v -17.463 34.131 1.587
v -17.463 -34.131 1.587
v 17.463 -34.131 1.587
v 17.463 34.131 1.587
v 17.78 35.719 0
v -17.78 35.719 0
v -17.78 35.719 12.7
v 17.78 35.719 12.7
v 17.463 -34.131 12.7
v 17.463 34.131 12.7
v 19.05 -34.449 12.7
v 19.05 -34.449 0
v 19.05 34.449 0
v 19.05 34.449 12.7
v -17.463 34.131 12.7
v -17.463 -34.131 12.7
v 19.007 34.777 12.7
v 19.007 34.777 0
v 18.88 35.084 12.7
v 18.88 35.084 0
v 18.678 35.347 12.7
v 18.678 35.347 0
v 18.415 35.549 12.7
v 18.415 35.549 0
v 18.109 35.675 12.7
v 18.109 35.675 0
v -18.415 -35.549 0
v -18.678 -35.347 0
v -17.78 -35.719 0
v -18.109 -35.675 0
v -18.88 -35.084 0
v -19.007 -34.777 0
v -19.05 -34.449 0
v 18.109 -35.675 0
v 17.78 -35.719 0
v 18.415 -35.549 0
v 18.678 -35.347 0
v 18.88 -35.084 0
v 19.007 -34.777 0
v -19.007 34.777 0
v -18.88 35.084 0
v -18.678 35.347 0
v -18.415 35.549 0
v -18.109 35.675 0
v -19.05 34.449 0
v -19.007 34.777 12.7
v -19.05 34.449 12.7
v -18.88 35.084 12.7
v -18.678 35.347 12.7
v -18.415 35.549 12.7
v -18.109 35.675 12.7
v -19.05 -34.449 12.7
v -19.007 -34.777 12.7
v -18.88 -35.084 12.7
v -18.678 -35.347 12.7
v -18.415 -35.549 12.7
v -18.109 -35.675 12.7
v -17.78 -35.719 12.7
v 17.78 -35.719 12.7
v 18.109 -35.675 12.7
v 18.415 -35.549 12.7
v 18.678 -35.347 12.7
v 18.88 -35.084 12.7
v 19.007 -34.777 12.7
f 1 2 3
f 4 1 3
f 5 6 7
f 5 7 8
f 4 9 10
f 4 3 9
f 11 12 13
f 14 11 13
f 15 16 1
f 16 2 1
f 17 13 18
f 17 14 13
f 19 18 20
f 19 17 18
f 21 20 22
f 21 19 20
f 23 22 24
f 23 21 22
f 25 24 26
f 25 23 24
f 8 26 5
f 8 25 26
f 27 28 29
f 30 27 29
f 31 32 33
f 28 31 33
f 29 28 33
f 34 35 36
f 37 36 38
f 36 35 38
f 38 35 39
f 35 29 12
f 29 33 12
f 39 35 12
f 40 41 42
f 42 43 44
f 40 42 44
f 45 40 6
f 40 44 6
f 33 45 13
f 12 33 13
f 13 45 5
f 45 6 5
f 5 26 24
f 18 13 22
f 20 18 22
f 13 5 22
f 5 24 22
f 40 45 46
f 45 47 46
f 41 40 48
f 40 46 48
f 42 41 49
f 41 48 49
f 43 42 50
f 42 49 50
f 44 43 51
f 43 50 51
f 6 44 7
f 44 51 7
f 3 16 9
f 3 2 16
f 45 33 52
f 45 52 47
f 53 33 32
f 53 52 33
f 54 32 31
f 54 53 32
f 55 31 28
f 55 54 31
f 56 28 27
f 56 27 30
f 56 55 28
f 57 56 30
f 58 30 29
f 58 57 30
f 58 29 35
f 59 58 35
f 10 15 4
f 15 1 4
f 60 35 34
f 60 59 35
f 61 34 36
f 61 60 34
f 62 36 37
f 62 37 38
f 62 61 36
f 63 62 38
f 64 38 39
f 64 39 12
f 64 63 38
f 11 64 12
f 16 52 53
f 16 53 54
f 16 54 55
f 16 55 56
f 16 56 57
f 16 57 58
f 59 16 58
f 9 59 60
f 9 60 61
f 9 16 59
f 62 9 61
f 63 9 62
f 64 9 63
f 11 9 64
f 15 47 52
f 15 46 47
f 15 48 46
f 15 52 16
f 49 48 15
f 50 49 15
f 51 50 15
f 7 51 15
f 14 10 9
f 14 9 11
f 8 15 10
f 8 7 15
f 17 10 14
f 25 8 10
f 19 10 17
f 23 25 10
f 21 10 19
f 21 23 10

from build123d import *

# Parameters (mm, degrees)
F0_W     = 38.1
F0_H     = 71.4375
F1_DEPTH = 12.7
F2_T     = -1.5875
F3_R     = 1.27


with BuildPart() as f1:
    # F0 (on Top) → F1 (new body)
    with BuildSketch(Plane.XY):
        Rectangle(F0_W, F0_H)
    extrude(amount=F1_DEPTH)

    # F2
    f2_openings = [f1.faces().sort_by_distance(p)[0] for p in [
        (0, 0, 12.7),
    ]]
    offset(amount=F2_T, openings=f2_openings)

    # F3
    f3_edges = [f1.edges().sort_by_distance(p)[0] for p in [
        (-19.05, -35.71875, 6.35),
        (19.05, -35.71875, 6.35),
        (-19.05, 35.71875, 6.35),
        (19.05, 35.71875, 6.35),
    ]]
    fillet(f3_edges, radius=F3_R)


solid = f1.part
